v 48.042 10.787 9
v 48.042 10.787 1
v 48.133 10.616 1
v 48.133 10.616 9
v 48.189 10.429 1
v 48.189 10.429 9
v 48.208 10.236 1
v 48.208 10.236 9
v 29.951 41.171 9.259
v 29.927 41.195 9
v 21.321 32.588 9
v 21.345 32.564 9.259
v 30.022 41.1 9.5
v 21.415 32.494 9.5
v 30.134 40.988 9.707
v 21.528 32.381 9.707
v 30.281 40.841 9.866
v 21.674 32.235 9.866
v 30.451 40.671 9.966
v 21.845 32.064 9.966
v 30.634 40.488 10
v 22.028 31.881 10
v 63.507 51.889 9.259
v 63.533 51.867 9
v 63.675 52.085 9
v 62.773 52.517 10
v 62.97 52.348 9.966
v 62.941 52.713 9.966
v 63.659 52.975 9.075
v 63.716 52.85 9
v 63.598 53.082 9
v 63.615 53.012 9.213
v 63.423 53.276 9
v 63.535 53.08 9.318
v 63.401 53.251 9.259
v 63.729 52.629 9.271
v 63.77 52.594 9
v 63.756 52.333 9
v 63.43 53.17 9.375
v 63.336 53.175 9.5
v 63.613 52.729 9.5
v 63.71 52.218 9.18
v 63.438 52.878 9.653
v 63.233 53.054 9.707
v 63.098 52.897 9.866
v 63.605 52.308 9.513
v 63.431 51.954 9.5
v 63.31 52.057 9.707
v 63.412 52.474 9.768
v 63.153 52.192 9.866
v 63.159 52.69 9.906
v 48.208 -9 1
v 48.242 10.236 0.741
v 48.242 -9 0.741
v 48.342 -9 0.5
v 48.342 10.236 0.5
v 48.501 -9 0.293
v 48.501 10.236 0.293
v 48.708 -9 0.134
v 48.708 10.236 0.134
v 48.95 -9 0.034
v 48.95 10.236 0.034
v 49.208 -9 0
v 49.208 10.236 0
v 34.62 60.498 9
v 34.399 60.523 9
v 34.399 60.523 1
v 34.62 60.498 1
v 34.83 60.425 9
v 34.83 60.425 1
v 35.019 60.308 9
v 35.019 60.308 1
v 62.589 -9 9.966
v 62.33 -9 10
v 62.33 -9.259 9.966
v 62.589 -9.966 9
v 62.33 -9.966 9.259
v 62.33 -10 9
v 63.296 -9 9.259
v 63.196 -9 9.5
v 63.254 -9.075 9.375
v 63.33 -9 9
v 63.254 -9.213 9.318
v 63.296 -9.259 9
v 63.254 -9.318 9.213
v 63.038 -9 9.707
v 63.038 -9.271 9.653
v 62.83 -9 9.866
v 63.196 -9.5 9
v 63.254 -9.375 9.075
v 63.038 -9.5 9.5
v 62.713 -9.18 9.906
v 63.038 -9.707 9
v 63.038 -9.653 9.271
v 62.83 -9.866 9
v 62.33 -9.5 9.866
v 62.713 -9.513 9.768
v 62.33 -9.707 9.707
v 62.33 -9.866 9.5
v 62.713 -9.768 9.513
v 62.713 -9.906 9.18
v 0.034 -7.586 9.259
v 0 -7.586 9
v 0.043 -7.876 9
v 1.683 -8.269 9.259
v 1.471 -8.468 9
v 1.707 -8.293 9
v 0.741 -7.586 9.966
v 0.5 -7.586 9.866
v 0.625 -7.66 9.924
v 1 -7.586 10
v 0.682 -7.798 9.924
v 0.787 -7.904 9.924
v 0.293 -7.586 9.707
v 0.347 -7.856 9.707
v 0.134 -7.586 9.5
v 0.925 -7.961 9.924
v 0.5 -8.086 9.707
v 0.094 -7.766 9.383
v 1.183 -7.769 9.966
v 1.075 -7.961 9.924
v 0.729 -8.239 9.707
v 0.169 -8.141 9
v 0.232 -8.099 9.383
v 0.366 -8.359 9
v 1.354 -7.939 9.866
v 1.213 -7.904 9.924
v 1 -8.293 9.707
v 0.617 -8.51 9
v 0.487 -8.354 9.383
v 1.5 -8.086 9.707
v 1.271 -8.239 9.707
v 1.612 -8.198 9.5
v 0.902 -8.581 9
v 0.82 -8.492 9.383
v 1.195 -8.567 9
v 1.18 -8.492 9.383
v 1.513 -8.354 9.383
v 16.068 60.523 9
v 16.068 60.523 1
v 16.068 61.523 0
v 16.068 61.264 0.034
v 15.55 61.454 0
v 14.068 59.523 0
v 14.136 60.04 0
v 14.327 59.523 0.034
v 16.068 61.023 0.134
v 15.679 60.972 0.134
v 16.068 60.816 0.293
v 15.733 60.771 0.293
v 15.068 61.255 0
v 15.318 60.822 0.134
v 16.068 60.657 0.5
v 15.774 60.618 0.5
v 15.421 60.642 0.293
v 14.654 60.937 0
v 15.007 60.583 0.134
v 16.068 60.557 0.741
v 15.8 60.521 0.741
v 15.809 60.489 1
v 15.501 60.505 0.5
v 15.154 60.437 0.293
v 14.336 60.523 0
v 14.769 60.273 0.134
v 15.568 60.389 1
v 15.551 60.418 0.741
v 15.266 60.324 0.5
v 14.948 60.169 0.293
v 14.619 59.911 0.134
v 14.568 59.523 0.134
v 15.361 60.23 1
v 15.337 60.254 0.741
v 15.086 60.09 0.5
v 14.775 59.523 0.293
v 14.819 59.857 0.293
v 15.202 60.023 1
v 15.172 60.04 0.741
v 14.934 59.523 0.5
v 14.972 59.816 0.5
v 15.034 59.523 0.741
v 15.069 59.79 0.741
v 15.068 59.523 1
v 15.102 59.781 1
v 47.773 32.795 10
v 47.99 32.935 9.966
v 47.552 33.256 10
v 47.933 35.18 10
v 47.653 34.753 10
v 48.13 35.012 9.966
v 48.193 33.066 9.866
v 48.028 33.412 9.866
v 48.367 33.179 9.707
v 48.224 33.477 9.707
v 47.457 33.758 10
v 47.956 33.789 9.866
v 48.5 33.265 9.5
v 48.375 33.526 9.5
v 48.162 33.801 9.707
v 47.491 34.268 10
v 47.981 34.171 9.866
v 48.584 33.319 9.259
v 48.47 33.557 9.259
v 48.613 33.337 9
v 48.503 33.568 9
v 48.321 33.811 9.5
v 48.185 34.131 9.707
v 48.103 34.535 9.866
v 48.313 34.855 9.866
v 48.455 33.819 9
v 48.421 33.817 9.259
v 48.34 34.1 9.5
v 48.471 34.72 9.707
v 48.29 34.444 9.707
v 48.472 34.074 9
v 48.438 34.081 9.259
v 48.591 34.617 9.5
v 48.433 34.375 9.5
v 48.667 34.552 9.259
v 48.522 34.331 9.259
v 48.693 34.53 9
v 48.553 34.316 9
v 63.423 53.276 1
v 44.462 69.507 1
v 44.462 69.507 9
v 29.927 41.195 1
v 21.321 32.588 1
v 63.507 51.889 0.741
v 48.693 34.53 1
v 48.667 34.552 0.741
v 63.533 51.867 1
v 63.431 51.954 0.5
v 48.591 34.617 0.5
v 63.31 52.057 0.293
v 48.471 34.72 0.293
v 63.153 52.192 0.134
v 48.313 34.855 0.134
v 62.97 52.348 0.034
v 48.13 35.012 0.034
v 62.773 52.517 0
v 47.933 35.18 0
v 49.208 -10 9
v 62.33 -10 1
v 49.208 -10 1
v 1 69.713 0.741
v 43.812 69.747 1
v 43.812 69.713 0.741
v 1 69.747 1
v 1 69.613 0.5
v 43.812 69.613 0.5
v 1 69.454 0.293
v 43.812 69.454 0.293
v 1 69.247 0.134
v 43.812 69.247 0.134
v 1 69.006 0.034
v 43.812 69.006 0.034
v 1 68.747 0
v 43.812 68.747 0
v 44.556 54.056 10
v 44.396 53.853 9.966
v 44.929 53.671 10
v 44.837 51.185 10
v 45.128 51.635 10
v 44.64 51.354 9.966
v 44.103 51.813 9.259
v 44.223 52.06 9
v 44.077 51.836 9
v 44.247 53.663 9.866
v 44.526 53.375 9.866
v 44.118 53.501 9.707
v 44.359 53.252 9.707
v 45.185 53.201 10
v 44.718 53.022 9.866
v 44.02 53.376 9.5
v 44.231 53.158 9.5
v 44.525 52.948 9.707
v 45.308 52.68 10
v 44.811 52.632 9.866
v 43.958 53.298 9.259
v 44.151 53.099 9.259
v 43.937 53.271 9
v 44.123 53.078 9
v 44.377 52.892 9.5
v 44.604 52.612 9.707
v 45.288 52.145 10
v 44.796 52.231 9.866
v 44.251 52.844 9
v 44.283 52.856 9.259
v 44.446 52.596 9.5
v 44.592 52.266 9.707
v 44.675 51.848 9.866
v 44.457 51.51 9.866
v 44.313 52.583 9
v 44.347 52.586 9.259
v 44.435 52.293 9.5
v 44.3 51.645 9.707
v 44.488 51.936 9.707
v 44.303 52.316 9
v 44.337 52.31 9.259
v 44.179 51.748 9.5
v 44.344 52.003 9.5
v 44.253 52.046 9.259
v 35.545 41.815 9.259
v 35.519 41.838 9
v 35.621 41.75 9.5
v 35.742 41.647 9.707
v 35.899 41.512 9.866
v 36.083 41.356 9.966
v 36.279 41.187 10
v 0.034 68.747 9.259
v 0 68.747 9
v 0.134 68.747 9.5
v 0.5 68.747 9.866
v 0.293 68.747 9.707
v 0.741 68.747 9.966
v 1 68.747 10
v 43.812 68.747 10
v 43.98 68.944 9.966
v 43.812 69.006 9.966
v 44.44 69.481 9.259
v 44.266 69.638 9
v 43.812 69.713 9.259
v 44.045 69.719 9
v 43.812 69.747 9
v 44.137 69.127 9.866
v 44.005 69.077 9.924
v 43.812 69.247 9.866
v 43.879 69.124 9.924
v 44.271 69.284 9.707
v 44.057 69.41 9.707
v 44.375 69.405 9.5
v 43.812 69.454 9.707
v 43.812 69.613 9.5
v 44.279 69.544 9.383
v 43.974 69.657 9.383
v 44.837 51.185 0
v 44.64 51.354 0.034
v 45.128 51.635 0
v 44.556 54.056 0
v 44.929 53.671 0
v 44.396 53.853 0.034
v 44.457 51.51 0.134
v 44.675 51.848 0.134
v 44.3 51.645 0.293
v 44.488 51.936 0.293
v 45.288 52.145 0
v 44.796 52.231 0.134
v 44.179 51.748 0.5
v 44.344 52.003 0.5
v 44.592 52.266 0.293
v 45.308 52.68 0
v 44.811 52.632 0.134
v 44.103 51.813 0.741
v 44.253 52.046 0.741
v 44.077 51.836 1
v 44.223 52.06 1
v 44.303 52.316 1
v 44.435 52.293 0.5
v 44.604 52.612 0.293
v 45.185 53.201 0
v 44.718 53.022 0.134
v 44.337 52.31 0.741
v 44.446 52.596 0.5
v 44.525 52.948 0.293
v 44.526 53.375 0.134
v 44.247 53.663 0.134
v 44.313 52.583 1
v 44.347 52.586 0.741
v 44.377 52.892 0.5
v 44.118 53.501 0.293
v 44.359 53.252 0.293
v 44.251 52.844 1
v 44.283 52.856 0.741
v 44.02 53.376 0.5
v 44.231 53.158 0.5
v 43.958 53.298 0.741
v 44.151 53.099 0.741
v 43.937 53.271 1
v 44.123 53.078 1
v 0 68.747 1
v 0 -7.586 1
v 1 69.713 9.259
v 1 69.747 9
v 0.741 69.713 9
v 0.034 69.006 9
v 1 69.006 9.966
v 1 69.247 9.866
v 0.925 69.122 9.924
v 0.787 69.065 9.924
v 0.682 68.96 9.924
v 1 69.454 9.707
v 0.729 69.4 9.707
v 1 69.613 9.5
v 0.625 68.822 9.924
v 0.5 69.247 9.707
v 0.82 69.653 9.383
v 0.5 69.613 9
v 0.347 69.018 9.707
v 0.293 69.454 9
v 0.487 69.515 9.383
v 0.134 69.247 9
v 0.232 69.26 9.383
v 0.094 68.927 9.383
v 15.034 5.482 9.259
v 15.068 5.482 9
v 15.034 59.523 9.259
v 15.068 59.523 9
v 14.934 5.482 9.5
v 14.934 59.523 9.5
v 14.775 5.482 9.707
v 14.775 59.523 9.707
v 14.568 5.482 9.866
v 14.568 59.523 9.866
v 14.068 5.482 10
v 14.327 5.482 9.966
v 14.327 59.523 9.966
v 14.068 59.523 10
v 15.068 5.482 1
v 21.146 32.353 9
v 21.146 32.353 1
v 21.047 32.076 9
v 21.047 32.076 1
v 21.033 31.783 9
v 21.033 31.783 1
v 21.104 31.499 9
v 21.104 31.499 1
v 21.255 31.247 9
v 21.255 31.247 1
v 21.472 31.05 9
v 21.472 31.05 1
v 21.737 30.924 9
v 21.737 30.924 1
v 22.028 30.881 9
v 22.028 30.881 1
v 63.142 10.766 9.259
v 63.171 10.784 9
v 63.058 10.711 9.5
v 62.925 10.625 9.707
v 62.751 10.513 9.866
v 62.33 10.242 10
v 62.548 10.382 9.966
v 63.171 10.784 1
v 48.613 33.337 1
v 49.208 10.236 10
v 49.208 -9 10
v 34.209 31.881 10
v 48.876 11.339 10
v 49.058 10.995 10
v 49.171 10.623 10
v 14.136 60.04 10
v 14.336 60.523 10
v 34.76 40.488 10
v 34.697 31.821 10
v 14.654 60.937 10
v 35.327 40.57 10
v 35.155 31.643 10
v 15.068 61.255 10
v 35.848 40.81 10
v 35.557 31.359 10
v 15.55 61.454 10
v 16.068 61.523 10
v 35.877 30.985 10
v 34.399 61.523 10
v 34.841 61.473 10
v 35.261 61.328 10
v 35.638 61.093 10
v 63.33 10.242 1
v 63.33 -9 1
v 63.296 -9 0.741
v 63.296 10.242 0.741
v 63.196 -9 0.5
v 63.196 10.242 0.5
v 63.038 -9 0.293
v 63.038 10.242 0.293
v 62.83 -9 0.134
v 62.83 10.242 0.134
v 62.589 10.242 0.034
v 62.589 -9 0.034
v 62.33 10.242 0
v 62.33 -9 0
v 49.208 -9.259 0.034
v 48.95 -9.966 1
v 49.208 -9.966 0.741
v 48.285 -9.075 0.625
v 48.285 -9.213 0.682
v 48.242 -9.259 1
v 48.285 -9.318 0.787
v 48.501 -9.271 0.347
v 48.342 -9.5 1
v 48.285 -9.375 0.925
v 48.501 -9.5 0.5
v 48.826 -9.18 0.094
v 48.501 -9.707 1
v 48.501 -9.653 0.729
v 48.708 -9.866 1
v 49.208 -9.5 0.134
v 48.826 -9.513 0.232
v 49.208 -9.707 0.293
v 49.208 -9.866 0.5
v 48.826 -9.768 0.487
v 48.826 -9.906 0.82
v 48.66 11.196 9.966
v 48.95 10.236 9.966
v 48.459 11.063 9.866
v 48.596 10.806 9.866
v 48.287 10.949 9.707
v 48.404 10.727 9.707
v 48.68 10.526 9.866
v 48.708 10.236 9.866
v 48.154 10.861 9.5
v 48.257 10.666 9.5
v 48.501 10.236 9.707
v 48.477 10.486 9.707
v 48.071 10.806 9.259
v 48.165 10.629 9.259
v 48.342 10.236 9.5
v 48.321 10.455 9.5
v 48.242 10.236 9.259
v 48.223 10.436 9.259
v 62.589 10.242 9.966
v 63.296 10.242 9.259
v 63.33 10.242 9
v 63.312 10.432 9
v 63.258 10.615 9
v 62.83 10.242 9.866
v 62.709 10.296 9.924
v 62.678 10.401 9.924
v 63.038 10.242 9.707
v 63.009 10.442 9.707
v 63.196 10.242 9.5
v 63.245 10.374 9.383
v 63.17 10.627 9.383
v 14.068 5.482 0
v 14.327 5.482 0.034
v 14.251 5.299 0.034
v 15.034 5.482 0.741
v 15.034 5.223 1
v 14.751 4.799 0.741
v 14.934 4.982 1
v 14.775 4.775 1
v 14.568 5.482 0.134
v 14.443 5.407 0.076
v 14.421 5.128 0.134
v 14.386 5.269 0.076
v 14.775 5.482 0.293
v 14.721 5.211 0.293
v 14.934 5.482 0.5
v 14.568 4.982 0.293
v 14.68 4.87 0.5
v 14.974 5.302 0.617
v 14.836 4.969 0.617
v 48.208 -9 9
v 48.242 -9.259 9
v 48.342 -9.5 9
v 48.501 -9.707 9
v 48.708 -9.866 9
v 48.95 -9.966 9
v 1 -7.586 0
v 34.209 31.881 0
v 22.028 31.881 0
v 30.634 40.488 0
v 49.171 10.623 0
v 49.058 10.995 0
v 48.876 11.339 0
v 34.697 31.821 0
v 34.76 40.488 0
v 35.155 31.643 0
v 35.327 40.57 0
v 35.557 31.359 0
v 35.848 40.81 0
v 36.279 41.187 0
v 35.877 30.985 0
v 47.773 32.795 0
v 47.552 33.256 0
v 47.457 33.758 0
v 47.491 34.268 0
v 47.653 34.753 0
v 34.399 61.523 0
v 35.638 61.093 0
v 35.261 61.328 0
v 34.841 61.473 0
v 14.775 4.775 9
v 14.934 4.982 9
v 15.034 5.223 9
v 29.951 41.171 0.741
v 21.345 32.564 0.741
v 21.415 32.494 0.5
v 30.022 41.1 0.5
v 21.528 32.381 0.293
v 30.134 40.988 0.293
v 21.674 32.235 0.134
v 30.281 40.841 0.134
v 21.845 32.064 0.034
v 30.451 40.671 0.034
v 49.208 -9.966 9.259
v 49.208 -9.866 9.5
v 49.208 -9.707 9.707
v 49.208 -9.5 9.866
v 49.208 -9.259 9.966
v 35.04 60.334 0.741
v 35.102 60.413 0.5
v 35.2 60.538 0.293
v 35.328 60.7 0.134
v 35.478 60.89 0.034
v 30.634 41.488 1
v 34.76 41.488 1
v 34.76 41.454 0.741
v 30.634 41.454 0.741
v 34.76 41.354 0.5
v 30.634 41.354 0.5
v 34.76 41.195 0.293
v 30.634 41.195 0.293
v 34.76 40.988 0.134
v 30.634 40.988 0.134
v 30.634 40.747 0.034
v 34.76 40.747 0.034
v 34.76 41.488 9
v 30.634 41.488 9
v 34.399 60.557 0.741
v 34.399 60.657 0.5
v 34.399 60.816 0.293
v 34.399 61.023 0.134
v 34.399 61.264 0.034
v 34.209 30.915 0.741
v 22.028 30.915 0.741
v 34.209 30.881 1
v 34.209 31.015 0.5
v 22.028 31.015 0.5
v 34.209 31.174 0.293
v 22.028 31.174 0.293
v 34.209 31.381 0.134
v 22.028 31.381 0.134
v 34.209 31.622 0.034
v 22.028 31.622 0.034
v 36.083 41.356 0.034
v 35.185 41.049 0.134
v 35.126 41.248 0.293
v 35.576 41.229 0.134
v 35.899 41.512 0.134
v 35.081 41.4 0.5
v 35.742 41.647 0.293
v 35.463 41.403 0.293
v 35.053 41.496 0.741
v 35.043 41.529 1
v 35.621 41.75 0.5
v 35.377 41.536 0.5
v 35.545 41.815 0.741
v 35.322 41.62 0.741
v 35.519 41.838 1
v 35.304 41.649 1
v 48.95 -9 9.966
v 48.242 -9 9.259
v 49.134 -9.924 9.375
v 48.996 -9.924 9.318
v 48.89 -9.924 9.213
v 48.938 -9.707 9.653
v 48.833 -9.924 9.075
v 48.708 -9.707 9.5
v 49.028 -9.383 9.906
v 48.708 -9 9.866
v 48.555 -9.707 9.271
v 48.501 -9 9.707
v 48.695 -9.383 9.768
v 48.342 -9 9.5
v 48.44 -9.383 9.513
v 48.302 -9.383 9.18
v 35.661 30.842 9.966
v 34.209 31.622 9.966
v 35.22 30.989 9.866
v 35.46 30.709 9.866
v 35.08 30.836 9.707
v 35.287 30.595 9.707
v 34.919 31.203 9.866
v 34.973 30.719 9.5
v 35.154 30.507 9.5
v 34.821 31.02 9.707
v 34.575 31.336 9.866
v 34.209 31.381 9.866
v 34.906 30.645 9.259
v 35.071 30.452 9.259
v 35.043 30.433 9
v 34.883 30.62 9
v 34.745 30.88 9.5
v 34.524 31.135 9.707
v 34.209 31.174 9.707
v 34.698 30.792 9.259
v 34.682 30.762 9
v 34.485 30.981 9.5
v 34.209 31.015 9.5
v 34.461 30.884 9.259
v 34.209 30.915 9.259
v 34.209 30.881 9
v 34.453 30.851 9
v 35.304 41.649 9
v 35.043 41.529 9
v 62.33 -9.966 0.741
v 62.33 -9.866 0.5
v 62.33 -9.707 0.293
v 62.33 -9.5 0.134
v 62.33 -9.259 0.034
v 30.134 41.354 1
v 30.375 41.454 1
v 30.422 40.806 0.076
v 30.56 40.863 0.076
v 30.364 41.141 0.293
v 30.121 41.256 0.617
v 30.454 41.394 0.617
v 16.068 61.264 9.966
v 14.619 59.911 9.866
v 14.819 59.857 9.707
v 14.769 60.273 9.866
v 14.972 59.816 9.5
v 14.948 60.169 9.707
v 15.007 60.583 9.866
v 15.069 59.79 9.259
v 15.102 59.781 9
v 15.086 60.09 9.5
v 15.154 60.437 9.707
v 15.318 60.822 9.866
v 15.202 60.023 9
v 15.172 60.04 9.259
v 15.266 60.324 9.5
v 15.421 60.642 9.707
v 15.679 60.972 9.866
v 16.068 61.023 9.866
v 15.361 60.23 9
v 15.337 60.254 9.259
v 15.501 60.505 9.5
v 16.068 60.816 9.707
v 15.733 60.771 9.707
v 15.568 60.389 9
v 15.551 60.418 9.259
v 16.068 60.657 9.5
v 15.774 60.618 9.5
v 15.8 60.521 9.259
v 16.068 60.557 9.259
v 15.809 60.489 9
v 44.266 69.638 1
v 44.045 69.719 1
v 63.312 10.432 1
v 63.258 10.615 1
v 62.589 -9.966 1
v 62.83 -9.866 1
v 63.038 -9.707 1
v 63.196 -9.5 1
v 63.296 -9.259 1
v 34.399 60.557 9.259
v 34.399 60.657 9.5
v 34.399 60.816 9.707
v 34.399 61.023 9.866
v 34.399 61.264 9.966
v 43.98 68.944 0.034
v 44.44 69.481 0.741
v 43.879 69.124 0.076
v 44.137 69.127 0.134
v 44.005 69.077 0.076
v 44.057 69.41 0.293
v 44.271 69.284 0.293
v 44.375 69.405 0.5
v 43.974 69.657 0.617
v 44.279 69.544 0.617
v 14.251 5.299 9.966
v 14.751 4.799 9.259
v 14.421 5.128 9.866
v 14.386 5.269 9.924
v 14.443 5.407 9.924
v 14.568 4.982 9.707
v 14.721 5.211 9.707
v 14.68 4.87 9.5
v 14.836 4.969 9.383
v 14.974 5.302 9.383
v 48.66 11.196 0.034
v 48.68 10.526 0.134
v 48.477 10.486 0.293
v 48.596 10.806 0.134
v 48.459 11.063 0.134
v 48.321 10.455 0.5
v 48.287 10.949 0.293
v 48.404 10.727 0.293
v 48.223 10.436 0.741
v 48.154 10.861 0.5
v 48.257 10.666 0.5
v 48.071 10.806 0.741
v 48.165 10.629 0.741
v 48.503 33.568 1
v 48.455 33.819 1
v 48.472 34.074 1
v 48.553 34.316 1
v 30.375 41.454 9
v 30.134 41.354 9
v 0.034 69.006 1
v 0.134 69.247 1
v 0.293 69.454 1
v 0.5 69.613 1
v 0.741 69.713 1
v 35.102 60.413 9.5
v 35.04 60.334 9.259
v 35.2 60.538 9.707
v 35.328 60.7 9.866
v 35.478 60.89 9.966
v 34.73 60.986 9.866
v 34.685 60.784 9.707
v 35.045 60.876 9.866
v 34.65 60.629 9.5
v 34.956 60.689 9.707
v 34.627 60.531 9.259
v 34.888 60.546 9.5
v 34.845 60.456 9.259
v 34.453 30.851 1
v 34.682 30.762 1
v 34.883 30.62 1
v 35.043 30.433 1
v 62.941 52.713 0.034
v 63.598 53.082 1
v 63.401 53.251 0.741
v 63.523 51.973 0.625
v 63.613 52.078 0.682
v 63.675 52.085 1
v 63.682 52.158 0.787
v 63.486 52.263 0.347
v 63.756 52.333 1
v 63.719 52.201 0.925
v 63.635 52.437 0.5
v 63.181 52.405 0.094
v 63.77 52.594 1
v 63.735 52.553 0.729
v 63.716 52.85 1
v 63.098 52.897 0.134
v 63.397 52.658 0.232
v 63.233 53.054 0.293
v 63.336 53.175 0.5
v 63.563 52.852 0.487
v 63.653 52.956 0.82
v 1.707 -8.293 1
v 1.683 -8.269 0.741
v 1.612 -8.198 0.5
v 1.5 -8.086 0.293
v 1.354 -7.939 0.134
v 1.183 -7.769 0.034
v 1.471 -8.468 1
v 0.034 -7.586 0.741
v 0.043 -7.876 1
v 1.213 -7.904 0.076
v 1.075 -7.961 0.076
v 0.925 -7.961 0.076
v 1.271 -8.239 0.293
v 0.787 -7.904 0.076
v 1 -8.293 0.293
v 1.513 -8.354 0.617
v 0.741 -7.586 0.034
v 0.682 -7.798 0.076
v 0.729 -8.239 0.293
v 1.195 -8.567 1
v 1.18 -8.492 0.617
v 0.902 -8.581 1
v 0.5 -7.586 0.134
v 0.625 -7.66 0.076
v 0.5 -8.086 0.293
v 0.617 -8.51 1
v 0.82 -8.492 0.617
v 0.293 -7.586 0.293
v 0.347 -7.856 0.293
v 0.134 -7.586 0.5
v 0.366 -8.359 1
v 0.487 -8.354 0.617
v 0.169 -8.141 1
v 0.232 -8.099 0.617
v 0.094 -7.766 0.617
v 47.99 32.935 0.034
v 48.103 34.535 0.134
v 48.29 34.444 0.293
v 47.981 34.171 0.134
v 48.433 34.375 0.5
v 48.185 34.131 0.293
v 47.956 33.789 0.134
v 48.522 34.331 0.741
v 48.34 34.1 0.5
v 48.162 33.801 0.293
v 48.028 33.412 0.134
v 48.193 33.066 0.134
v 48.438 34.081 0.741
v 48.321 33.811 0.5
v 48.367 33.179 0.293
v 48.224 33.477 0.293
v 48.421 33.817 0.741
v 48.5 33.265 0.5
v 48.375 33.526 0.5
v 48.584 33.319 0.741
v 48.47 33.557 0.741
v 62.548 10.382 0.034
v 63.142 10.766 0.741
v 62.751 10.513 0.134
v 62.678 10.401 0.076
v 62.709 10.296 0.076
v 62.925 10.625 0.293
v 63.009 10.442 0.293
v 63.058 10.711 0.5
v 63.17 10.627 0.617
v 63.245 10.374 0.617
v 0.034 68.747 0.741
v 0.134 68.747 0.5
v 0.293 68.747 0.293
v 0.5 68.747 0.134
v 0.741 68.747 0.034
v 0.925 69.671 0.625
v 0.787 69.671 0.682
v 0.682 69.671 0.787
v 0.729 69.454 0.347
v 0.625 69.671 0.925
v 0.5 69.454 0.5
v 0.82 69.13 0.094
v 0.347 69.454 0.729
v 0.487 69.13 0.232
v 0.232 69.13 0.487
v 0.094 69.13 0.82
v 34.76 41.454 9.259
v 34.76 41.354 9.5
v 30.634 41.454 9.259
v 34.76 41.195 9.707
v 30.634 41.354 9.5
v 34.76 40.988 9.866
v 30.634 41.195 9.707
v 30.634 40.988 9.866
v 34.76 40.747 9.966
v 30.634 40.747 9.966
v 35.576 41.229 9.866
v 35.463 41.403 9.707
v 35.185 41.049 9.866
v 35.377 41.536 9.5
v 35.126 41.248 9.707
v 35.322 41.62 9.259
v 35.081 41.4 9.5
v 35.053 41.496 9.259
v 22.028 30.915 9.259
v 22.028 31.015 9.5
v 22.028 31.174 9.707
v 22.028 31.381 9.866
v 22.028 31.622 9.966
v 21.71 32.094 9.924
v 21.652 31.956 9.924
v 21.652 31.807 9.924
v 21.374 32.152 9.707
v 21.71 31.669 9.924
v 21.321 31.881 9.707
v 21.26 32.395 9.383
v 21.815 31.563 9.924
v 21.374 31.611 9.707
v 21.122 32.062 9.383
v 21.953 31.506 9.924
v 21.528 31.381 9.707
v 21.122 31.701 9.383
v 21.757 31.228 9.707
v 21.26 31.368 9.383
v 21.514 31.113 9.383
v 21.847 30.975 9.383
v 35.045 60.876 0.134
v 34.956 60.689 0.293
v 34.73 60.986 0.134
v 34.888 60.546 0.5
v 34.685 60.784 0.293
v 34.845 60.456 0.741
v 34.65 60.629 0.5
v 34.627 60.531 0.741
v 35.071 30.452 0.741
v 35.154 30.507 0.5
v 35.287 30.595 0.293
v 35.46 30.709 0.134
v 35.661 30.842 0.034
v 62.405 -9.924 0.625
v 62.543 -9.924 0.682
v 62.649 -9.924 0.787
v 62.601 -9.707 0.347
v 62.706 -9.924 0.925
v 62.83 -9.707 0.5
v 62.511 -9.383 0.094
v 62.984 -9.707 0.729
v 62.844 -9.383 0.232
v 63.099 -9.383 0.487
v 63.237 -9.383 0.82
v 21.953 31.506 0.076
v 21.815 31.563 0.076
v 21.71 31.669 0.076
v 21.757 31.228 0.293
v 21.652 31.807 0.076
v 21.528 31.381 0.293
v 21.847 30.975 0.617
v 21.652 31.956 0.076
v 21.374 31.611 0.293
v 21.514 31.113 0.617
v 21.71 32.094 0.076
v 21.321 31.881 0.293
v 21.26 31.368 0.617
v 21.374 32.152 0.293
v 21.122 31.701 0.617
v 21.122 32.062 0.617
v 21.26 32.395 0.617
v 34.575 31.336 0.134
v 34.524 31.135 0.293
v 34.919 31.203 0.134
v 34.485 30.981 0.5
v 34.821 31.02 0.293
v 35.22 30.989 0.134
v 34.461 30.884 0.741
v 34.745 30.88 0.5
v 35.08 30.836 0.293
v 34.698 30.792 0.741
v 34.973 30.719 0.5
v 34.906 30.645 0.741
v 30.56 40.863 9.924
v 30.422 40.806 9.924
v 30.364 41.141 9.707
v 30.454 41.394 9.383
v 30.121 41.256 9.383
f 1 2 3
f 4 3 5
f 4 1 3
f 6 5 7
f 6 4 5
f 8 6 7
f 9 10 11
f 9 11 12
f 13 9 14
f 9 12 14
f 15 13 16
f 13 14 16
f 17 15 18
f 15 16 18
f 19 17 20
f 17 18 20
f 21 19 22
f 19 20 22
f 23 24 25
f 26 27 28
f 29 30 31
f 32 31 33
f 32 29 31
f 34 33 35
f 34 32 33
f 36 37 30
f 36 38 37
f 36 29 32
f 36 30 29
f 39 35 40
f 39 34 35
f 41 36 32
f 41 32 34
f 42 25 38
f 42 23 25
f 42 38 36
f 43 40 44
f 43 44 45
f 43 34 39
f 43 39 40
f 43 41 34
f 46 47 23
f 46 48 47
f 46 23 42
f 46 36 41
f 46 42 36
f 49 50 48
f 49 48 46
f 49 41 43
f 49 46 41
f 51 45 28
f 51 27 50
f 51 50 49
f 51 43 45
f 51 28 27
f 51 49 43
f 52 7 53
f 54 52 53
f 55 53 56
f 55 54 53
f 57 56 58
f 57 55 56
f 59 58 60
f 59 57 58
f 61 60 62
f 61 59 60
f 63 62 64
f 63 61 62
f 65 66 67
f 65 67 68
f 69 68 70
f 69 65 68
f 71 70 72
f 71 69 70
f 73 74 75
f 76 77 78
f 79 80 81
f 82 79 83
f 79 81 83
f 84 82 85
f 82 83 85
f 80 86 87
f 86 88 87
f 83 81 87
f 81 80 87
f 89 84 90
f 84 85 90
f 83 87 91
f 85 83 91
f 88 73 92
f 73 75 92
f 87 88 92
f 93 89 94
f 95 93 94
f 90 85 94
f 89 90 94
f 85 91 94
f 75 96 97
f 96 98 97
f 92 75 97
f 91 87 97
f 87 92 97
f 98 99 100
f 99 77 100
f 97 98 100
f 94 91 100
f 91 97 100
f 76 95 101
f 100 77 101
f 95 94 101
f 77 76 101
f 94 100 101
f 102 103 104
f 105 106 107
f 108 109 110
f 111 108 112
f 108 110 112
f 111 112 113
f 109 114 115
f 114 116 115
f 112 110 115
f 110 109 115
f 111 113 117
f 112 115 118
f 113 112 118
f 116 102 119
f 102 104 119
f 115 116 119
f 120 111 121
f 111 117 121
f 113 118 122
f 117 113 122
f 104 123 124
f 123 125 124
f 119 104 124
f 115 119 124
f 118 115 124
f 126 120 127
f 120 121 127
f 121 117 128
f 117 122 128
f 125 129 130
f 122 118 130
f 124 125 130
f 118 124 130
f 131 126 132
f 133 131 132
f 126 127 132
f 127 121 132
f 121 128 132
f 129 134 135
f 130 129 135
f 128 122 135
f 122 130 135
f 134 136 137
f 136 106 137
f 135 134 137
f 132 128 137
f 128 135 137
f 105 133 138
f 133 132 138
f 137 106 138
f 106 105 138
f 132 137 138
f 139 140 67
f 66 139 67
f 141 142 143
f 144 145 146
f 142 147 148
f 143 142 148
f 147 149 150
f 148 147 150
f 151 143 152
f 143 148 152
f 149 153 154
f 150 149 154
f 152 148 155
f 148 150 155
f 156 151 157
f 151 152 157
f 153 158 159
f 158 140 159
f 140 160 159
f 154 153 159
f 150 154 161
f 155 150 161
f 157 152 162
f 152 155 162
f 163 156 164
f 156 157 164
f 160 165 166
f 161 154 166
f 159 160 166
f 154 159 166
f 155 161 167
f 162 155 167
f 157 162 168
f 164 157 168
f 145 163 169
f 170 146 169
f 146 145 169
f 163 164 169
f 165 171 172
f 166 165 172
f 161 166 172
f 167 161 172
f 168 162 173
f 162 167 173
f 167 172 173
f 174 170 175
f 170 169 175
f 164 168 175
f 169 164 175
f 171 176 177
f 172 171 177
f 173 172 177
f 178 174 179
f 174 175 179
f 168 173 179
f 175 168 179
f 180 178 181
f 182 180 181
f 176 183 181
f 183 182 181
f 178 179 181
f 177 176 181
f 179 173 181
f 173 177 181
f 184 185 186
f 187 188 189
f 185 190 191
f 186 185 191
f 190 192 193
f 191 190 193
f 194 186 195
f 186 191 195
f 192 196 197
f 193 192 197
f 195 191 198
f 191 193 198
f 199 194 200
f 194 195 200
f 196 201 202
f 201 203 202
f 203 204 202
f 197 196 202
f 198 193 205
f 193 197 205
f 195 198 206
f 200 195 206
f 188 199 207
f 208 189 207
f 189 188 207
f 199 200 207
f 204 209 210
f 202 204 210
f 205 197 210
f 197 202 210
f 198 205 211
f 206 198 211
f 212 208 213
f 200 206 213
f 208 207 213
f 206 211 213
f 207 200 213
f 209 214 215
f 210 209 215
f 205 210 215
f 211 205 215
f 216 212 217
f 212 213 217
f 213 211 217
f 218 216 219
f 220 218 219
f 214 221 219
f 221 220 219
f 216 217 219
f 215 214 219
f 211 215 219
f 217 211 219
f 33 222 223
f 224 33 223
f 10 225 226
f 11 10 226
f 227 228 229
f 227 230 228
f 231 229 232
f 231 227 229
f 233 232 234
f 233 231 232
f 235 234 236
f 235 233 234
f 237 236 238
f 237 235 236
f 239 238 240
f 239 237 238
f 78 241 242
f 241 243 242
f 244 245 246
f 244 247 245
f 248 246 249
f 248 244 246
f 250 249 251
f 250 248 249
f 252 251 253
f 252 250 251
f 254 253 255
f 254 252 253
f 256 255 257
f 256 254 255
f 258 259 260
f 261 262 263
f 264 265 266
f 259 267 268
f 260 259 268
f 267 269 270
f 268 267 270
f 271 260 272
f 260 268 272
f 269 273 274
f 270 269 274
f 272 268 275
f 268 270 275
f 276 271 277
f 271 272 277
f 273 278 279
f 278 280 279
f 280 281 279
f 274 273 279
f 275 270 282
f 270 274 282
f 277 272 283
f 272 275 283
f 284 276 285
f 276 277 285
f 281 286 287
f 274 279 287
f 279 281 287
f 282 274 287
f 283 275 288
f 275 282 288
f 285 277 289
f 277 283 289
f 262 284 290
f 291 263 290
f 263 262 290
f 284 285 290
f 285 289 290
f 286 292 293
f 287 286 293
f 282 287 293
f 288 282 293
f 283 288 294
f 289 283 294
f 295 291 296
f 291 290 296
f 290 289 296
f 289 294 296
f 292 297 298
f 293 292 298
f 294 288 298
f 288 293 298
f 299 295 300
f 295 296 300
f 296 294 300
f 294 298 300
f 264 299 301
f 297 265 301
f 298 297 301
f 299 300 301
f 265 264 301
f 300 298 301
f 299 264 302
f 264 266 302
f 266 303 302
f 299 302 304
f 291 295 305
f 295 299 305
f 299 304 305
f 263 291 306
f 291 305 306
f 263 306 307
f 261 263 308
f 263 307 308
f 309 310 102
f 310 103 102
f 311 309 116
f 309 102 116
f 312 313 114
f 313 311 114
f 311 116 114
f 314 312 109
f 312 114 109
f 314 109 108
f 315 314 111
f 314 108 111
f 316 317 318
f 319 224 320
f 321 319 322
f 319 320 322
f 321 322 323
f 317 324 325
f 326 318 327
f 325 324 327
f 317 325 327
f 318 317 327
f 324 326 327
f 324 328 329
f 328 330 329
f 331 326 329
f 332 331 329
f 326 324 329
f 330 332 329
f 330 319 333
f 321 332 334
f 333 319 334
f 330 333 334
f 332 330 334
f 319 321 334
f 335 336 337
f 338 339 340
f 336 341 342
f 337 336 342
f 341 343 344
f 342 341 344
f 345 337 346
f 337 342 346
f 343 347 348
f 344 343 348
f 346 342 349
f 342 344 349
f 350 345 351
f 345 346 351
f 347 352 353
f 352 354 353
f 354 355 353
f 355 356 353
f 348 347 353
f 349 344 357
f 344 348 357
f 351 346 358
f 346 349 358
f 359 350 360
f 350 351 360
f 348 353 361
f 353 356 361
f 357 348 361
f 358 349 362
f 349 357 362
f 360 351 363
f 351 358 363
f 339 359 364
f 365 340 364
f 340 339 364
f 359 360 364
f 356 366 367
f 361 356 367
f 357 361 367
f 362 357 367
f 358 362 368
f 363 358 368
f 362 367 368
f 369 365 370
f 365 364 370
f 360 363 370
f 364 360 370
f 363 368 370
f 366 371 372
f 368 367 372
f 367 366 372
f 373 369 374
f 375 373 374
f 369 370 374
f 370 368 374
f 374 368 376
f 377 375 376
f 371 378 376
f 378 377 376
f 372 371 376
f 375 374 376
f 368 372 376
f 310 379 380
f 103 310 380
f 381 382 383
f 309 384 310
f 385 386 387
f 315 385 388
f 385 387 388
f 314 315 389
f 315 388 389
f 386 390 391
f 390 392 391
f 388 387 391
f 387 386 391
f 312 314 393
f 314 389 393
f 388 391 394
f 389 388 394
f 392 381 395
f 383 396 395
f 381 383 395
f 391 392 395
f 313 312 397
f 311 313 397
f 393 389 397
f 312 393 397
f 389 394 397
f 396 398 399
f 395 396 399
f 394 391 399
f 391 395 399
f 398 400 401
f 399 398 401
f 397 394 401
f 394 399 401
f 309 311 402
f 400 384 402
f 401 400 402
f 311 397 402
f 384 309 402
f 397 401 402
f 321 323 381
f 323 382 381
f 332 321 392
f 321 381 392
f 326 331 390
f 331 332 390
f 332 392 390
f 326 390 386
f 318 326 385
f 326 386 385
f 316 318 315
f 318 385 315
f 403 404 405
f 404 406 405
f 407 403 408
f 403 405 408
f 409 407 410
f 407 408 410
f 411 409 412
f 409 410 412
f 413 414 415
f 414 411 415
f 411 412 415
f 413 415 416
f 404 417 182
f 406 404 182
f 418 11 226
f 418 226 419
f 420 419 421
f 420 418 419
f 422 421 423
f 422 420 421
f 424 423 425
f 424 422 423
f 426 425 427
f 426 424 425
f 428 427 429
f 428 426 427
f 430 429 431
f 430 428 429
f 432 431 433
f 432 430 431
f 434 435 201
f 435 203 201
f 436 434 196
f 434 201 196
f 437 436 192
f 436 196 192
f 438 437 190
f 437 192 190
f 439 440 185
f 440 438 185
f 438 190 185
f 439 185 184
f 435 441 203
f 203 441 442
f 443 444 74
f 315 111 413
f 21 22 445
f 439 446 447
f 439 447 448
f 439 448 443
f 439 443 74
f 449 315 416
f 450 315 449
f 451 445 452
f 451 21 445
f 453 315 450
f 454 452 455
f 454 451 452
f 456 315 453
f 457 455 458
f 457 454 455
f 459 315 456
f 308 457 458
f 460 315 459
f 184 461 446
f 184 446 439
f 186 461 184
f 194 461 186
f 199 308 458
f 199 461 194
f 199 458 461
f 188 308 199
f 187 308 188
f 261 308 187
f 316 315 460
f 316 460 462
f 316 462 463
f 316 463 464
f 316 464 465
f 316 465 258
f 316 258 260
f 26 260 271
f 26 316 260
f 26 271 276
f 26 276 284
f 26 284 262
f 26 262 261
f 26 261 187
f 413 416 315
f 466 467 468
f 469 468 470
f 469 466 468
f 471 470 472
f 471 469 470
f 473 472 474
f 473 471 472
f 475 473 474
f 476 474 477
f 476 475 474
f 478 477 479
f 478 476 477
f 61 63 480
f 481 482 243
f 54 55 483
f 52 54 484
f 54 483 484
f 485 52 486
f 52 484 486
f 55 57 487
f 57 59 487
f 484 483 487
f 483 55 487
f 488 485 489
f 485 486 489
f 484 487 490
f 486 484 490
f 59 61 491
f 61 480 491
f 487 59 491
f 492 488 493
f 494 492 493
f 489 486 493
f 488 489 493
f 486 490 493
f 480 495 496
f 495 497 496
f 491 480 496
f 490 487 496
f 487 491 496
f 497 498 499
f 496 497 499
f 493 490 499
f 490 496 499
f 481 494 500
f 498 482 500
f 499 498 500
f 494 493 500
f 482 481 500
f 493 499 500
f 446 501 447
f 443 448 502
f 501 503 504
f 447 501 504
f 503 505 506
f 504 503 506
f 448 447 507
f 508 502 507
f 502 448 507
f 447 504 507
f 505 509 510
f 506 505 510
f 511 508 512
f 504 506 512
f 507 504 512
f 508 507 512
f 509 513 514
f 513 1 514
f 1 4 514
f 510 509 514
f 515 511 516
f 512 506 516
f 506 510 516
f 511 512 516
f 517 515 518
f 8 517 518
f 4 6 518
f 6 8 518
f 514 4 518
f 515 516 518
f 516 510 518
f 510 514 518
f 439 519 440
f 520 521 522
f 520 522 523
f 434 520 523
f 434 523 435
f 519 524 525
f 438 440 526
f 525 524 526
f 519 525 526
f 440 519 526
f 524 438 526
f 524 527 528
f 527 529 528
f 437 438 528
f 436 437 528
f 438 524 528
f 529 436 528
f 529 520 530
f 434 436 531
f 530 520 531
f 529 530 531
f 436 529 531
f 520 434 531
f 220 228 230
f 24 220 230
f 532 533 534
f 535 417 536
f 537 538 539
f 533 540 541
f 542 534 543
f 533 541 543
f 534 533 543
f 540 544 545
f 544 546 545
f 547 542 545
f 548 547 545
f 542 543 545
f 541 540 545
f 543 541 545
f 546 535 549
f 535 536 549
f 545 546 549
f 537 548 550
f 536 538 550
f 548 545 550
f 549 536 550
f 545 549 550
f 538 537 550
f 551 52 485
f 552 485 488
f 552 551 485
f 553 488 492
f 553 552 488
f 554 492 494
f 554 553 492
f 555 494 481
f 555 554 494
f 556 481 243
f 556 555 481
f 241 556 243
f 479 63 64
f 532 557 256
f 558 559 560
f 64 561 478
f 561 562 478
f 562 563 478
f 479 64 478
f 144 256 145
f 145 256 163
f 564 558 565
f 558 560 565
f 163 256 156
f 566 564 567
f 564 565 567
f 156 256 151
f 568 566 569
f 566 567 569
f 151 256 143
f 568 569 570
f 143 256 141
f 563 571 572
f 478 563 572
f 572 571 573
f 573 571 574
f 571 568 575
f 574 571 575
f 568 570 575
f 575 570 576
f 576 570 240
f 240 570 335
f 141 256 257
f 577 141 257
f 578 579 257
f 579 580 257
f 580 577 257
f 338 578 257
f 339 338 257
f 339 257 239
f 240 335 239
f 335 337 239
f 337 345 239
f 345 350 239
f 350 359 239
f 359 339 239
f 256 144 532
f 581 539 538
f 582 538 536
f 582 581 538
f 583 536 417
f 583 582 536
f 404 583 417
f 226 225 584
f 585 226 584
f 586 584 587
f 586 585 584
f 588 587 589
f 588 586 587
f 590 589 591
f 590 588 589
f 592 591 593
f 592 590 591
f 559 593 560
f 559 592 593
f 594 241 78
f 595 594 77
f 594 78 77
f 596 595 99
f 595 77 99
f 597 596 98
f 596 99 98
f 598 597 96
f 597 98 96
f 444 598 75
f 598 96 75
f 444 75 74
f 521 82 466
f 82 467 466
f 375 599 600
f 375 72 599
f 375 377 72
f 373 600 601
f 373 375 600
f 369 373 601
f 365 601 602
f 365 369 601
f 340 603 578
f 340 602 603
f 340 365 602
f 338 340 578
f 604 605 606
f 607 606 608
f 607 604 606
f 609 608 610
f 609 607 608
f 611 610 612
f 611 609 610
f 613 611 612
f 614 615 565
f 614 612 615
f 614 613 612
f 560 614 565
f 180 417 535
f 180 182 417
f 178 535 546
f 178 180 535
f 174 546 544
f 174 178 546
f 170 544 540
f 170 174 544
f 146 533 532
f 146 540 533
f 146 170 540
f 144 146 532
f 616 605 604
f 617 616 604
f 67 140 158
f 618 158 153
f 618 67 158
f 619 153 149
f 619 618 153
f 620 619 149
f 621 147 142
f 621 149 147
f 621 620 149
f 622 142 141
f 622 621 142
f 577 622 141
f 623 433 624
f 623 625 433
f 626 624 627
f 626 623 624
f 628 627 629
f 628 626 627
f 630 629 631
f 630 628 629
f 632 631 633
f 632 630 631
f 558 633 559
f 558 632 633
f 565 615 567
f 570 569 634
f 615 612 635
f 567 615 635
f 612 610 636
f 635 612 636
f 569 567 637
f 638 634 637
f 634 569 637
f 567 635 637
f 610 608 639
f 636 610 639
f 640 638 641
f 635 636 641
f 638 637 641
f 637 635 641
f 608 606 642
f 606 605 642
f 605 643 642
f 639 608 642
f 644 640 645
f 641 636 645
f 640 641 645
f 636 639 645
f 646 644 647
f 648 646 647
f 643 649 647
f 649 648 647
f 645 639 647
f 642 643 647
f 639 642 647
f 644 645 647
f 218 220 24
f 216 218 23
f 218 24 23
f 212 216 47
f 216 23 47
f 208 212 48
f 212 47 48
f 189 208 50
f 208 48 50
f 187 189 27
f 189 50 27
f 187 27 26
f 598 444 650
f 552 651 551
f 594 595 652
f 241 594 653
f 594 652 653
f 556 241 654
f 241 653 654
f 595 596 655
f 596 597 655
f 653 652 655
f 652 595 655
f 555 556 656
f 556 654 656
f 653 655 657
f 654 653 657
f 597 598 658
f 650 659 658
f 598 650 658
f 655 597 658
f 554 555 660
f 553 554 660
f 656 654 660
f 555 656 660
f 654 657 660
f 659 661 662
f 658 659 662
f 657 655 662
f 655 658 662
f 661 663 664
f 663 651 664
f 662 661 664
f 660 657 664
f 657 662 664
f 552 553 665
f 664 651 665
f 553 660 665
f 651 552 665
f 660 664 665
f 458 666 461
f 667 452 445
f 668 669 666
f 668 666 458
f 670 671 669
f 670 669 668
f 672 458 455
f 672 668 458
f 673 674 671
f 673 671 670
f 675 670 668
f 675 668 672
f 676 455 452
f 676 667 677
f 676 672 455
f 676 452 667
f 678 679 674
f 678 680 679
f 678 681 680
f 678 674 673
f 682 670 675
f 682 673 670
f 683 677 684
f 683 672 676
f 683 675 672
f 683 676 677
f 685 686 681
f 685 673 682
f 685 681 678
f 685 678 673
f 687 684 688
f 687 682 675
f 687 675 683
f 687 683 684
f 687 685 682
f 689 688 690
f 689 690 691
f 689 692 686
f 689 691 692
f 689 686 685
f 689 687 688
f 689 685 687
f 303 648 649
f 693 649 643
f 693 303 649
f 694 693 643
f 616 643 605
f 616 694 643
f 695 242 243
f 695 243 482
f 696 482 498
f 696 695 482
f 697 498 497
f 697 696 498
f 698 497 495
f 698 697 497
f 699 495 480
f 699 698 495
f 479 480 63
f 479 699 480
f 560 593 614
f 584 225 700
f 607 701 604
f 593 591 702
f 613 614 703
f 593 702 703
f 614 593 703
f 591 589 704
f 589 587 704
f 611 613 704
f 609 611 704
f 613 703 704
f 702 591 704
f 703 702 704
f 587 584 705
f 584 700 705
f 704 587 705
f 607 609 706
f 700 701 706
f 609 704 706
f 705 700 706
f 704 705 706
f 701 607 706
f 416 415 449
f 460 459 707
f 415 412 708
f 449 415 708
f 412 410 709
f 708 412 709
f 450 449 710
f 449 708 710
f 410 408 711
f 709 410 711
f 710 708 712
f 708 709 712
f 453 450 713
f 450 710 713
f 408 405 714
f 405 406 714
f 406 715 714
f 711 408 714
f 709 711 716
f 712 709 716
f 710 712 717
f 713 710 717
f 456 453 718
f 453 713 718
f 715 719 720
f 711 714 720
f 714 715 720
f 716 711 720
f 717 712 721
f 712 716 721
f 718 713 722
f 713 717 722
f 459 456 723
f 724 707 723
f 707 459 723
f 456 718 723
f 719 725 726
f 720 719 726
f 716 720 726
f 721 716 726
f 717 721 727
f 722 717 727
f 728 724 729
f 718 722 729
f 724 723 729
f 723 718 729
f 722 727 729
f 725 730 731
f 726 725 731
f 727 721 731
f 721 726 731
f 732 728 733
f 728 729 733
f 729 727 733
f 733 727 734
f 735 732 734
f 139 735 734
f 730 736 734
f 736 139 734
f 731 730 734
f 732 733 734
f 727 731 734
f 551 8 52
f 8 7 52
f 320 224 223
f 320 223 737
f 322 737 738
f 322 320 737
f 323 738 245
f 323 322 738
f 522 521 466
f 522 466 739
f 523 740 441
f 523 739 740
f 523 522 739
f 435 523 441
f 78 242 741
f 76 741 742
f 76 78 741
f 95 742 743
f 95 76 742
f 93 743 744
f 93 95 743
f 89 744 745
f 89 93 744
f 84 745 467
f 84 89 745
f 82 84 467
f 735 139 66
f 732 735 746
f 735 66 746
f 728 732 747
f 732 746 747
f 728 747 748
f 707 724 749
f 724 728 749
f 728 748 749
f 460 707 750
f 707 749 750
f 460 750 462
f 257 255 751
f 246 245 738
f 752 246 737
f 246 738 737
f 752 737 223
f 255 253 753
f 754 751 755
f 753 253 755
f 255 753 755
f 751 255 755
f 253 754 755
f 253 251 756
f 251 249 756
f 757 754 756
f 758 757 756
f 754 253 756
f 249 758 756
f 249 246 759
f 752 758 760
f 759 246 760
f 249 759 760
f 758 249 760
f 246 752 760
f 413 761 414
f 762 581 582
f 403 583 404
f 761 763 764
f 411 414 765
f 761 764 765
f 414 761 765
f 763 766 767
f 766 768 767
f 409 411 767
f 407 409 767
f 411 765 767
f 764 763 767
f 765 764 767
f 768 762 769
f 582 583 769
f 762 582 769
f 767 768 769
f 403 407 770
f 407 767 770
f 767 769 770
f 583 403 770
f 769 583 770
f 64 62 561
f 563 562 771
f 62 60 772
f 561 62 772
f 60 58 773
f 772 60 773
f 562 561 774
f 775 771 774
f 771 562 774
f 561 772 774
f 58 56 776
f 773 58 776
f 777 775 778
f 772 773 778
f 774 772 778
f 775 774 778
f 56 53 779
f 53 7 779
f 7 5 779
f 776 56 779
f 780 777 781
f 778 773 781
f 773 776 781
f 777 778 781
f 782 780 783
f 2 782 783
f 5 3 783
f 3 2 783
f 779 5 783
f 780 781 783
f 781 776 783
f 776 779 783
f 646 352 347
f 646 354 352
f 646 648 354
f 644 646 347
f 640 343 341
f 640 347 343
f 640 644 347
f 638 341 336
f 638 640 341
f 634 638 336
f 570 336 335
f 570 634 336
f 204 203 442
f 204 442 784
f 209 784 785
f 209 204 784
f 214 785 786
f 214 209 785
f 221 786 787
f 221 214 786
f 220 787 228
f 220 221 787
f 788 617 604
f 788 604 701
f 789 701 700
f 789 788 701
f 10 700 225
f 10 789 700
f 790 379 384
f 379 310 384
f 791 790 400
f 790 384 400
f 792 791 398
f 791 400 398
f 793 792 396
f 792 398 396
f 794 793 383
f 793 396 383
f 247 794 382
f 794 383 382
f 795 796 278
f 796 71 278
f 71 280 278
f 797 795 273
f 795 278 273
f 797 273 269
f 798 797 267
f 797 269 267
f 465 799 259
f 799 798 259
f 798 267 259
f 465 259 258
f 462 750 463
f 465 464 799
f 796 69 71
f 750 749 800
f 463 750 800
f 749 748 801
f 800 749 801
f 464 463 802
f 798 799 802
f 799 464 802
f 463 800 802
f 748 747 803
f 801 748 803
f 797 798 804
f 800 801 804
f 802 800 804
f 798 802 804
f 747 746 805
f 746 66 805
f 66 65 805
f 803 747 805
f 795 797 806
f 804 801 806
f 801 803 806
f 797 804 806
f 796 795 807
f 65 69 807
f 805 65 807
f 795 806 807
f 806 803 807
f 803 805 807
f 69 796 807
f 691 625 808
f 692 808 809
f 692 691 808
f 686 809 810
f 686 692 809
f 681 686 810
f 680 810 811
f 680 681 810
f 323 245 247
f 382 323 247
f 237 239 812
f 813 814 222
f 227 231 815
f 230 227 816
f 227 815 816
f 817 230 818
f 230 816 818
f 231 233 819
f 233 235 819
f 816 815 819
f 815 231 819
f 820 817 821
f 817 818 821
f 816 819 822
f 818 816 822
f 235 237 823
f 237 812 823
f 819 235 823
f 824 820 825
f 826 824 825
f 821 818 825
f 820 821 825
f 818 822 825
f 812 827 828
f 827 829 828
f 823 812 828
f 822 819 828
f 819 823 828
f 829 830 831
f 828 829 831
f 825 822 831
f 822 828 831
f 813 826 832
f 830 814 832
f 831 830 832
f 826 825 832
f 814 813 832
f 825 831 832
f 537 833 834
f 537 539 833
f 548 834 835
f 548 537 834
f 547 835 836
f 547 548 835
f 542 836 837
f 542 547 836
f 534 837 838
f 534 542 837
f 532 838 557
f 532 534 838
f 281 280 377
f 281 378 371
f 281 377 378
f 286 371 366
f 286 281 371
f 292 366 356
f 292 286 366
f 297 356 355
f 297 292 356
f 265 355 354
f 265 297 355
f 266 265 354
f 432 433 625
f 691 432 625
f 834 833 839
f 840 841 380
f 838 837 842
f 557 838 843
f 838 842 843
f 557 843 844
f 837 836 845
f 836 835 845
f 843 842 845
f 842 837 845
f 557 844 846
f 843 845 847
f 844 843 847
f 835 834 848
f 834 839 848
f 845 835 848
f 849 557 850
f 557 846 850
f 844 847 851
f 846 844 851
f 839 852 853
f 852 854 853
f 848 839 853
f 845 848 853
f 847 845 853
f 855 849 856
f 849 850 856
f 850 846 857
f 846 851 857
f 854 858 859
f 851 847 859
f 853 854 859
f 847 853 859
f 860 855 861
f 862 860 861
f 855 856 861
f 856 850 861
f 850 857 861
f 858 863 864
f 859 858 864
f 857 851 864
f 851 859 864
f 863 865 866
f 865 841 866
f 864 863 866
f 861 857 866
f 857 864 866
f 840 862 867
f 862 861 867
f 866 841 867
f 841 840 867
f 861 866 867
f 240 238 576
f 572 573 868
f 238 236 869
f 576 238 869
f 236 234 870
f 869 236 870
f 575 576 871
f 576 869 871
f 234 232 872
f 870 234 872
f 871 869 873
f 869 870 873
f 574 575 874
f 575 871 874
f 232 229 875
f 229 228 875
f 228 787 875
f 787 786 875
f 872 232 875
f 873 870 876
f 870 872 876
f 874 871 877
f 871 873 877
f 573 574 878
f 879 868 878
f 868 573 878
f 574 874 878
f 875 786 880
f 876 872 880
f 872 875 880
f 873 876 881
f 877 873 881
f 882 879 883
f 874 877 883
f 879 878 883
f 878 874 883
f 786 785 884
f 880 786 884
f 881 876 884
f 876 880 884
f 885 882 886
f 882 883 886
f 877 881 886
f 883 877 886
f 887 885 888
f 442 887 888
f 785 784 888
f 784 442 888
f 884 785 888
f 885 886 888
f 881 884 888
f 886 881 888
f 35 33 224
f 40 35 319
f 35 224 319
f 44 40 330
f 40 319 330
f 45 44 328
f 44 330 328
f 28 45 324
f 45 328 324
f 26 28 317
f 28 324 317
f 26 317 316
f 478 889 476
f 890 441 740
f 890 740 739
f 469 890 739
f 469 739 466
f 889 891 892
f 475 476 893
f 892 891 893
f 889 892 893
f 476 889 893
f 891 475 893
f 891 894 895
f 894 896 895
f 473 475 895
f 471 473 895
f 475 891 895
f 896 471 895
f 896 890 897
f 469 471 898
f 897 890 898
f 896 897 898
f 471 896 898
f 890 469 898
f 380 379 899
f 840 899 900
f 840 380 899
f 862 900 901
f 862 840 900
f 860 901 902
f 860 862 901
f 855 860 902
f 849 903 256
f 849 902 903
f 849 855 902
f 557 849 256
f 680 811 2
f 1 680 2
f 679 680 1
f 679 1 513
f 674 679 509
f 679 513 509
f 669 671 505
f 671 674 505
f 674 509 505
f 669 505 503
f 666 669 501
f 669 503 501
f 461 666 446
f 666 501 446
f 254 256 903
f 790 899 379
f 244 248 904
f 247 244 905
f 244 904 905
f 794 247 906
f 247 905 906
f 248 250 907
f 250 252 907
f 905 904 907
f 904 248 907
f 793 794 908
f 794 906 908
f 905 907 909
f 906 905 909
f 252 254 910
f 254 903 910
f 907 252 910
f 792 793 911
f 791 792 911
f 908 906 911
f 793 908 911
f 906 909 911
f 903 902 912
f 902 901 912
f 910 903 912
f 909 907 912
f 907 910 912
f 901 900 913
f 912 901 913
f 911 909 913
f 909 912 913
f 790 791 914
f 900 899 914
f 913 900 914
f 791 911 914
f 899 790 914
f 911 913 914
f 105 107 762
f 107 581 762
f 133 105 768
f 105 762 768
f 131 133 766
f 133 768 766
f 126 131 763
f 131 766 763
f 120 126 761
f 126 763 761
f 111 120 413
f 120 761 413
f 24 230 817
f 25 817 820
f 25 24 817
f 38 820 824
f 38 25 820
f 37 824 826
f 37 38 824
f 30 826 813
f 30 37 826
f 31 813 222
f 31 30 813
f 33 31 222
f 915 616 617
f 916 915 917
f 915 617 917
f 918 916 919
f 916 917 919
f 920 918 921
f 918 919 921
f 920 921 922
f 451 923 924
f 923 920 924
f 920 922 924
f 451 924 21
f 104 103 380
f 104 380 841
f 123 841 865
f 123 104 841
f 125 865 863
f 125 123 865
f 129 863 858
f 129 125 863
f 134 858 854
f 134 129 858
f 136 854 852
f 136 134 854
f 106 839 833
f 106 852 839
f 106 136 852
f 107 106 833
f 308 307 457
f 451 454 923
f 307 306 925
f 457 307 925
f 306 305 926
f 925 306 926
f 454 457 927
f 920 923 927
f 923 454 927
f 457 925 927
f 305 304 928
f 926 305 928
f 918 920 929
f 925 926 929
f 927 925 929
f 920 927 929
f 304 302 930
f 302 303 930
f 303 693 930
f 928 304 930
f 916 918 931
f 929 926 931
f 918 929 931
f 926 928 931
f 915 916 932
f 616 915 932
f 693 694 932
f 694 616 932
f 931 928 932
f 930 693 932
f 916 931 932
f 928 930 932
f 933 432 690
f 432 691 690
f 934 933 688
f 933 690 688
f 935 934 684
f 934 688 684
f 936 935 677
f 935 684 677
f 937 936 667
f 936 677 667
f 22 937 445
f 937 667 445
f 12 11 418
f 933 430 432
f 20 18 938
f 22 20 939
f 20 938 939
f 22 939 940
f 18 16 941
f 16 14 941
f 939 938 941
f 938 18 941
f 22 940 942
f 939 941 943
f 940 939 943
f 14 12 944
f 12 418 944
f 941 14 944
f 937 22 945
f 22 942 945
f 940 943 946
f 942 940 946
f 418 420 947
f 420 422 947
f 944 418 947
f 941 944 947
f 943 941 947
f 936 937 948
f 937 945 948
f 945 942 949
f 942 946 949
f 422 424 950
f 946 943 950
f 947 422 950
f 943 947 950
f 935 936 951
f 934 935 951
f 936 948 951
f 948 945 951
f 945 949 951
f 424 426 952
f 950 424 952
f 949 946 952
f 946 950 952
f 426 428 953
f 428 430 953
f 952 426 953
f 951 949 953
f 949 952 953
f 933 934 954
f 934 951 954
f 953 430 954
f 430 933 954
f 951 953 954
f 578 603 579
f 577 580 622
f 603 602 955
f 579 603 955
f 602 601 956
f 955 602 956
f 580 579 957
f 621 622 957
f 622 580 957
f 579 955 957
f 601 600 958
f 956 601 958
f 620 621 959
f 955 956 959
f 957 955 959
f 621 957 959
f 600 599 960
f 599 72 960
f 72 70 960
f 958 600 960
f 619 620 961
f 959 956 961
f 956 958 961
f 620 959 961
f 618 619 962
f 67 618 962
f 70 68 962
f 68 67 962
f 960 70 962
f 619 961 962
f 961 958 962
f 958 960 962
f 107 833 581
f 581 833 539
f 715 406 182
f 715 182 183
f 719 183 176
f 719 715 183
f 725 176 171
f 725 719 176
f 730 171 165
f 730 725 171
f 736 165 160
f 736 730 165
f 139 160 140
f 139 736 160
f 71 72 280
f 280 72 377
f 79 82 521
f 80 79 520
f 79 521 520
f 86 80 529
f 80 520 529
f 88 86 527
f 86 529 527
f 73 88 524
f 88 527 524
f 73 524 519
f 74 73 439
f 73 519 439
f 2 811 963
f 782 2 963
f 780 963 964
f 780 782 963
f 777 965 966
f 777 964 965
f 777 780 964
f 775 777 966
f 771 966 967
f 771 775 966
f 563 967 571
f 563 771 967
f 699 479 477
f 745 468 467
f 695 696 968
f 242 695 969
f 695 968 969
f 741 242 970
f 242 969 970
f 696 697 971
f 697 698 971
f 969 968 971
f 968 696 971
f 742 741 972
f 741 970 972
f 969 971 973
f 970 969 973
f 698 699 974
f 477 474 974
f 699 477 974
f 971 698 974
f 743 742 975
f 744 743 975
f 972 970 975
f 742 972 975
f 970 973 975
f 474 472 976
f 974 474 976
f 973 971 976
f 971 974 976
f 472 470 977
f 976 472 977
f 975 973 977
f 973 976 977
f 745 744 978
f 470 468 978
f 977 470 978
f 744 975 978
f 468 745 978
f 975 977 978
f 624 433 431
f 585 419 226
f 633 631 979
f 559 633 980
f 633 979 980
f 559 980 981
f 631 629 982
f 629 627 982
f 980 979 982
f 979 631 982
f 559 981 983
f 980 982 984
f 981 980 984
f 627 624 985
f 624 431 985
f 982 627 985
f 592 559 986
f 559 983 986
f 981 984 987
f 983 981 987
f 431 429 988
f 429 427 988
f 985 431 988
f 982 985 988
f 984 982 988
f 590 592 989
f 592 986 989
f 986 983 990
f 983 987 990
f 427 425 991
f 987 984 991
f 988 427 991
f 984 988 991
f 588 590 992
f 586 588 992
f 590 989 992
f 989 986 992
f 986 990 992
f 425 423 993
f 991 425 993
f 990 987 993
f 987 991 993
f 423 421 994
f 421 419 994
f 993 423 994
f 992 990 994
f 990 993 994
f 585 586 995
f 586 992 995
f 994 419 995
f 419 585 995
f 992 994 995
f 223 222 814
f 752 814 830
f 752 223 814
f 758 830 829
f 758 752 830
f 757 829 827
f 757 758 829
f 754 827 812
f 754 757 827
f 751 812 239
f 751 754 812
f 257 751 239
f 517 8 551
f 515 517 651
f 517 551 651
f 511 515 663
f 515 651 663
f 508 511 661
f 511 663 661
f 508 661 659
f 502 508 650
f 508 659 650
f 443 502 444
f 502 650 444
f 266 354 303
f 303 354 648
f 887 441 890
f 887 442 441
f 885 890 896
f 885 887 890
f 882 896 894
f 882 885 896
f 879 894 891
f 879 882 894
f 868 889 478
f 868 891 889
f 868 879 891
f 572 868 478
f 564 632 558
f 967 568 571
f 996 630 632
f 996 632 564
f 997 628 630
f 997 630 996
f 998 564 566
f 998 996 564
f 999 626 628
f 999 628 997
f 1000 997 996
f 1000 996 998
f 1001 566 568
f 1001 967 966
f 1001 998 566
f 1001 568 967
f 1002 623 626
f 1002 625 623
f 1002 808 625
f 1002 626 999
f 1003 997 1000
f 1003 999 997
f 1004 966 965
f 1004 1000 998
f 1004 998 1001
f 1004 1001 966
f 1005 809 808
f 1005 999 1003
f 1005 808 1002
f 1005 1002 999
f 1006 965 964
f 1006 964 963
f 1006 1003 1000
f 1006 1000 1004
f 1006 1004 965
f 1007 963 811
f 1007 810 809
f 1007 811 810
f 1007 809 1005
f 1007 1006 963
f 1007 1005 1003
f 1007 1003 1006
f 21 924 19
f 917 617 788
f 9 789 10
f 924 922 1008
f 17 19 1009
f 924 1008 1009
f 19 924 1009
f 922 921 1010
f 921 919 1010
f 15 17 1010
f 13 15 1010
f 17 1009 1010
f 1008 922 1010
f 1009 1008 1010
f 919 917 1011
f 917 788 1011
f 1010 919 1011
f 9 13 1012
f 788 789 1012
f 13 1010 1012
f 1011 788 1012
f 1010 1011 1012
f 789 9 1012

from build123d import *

# Parameters (mm, degrees)
BOSS_EXTRUDE1_DEPTH = 10
FILLET3_R           = 1


with BuildPart() as part:
    # Sketch3 → Boss-Extrude1 (new body)
    with BuildSketch(Plane.XY):
        Polygon((0, 69.747073231), (0, 0), (0, -10), (15.06772633, 5.06772633), (15.06772633, 15.577629005), (15.06772633, 60.522611967), (34.746102146, 60.522611967), (44.75412708, 52.626214838), (35.220089692, 41.487878952), (30.220089692, 41.487878952), (19.613487974, 30.881277234), (34.746102146, 30.881277234), (48.208411003, 10.536544123), (48.208411003, 0), (48.208411003, -10), (63.3304478, -10), (63.3304478, -0.075498865), (63.3304478, 0), (63.3304478, 10.536544123), (48.208411003, 33.963716022), (64.182876427, 52.626214838), (44.18108037, 69.747073231), align=None)
    extrude(amount=BOSS_EXTRUDE1_DEPTH)

    # Fillet3
    fillet3_edges = [part.edges().sort_by_distance(p)[0] for p in [
        (48.208411003, 0.268272062, 10),
        (55.769429402, -10, 10),
        (27.17979506, 30.881277234, 0),
        (24.916788833, 36.184578093, 0),
        (32.720089692, 41.487878952, 0),
        (39.987108386, 47.057046895, 0),
        (39.750114613, 56.574413402, 0),
        (24.906914238, 60.522611967, 0),
        (63.3304478, 0.268272062, 10),
        (15.06772633, 32.795169148, 0),
        (7.533863165, -2.466136835, 0),
        (0, 29.873536616, 0),
        (22.090540185, 69.747073231, 0),
        (54.181978398, 61.186644035, 0),
        (56.195643715, 43.29496543, 0),
        (55.769429402, 22.250130073, 0),
        (63.3304478, 0.268272062, 0),
        (55.769429402, -10, 0),
        (48.208411003, 0.268272062, 0),
        (41.477256575, 20.708910679, 0),
        (55.769429402, 22.250130073, 10),
        (34.746102146, 30.881277234, 5),
        (19.613487974, 30.881277234, 5),
        (30.220089692, 41.487878952, 5),
        (35.220089692, 41.487878952, 5),
        (44.75412708, 52.626214838, 5),
        (56.195643715, 43.29496543, 10),
        (34.746102146, 60.522611967, 5),
        (15.06772633, 60.522611967, 5),
        (15.06772633, 5.06772633, 5),
        (0, -10, 5),
        (0, 69.747073231, 5),
        (44.18108037, 69.747073231, 5),
        (64.182876427, 52.626214838, 5),
        (48.208411003, 33.963716022, 5),
        (63.3304478, 10.536544123, 5),
        (63.3304478, -10, 5),
        (48.208411003, -10, 5),
        (48.208411003, 10.536544123, 5),
        (54.181978398, 61.186644035, 10),
        (22.090540185, 69.747073231, 10),
        (0, 29.873536616, 10),
        (7.533863165, -2.466136835, 10),
        (41.477256575, 20.708910679, 10),
        (15.06772633, 32.795169148, 10),
        (24.906914238, 60.522611967, 10),
        (39.750114613, 56.574413402, 10),
        (39.987108386, 47.057046895, 10),
        (32.720089692, 41.487878952, 10),
        (24.916788833, 36.184578093, 10),
        (27.17979506, 30.881277234, 10),
    ]]
    fillet(fillet3_edges, radius=FILLET3_R)


solid = part.part
